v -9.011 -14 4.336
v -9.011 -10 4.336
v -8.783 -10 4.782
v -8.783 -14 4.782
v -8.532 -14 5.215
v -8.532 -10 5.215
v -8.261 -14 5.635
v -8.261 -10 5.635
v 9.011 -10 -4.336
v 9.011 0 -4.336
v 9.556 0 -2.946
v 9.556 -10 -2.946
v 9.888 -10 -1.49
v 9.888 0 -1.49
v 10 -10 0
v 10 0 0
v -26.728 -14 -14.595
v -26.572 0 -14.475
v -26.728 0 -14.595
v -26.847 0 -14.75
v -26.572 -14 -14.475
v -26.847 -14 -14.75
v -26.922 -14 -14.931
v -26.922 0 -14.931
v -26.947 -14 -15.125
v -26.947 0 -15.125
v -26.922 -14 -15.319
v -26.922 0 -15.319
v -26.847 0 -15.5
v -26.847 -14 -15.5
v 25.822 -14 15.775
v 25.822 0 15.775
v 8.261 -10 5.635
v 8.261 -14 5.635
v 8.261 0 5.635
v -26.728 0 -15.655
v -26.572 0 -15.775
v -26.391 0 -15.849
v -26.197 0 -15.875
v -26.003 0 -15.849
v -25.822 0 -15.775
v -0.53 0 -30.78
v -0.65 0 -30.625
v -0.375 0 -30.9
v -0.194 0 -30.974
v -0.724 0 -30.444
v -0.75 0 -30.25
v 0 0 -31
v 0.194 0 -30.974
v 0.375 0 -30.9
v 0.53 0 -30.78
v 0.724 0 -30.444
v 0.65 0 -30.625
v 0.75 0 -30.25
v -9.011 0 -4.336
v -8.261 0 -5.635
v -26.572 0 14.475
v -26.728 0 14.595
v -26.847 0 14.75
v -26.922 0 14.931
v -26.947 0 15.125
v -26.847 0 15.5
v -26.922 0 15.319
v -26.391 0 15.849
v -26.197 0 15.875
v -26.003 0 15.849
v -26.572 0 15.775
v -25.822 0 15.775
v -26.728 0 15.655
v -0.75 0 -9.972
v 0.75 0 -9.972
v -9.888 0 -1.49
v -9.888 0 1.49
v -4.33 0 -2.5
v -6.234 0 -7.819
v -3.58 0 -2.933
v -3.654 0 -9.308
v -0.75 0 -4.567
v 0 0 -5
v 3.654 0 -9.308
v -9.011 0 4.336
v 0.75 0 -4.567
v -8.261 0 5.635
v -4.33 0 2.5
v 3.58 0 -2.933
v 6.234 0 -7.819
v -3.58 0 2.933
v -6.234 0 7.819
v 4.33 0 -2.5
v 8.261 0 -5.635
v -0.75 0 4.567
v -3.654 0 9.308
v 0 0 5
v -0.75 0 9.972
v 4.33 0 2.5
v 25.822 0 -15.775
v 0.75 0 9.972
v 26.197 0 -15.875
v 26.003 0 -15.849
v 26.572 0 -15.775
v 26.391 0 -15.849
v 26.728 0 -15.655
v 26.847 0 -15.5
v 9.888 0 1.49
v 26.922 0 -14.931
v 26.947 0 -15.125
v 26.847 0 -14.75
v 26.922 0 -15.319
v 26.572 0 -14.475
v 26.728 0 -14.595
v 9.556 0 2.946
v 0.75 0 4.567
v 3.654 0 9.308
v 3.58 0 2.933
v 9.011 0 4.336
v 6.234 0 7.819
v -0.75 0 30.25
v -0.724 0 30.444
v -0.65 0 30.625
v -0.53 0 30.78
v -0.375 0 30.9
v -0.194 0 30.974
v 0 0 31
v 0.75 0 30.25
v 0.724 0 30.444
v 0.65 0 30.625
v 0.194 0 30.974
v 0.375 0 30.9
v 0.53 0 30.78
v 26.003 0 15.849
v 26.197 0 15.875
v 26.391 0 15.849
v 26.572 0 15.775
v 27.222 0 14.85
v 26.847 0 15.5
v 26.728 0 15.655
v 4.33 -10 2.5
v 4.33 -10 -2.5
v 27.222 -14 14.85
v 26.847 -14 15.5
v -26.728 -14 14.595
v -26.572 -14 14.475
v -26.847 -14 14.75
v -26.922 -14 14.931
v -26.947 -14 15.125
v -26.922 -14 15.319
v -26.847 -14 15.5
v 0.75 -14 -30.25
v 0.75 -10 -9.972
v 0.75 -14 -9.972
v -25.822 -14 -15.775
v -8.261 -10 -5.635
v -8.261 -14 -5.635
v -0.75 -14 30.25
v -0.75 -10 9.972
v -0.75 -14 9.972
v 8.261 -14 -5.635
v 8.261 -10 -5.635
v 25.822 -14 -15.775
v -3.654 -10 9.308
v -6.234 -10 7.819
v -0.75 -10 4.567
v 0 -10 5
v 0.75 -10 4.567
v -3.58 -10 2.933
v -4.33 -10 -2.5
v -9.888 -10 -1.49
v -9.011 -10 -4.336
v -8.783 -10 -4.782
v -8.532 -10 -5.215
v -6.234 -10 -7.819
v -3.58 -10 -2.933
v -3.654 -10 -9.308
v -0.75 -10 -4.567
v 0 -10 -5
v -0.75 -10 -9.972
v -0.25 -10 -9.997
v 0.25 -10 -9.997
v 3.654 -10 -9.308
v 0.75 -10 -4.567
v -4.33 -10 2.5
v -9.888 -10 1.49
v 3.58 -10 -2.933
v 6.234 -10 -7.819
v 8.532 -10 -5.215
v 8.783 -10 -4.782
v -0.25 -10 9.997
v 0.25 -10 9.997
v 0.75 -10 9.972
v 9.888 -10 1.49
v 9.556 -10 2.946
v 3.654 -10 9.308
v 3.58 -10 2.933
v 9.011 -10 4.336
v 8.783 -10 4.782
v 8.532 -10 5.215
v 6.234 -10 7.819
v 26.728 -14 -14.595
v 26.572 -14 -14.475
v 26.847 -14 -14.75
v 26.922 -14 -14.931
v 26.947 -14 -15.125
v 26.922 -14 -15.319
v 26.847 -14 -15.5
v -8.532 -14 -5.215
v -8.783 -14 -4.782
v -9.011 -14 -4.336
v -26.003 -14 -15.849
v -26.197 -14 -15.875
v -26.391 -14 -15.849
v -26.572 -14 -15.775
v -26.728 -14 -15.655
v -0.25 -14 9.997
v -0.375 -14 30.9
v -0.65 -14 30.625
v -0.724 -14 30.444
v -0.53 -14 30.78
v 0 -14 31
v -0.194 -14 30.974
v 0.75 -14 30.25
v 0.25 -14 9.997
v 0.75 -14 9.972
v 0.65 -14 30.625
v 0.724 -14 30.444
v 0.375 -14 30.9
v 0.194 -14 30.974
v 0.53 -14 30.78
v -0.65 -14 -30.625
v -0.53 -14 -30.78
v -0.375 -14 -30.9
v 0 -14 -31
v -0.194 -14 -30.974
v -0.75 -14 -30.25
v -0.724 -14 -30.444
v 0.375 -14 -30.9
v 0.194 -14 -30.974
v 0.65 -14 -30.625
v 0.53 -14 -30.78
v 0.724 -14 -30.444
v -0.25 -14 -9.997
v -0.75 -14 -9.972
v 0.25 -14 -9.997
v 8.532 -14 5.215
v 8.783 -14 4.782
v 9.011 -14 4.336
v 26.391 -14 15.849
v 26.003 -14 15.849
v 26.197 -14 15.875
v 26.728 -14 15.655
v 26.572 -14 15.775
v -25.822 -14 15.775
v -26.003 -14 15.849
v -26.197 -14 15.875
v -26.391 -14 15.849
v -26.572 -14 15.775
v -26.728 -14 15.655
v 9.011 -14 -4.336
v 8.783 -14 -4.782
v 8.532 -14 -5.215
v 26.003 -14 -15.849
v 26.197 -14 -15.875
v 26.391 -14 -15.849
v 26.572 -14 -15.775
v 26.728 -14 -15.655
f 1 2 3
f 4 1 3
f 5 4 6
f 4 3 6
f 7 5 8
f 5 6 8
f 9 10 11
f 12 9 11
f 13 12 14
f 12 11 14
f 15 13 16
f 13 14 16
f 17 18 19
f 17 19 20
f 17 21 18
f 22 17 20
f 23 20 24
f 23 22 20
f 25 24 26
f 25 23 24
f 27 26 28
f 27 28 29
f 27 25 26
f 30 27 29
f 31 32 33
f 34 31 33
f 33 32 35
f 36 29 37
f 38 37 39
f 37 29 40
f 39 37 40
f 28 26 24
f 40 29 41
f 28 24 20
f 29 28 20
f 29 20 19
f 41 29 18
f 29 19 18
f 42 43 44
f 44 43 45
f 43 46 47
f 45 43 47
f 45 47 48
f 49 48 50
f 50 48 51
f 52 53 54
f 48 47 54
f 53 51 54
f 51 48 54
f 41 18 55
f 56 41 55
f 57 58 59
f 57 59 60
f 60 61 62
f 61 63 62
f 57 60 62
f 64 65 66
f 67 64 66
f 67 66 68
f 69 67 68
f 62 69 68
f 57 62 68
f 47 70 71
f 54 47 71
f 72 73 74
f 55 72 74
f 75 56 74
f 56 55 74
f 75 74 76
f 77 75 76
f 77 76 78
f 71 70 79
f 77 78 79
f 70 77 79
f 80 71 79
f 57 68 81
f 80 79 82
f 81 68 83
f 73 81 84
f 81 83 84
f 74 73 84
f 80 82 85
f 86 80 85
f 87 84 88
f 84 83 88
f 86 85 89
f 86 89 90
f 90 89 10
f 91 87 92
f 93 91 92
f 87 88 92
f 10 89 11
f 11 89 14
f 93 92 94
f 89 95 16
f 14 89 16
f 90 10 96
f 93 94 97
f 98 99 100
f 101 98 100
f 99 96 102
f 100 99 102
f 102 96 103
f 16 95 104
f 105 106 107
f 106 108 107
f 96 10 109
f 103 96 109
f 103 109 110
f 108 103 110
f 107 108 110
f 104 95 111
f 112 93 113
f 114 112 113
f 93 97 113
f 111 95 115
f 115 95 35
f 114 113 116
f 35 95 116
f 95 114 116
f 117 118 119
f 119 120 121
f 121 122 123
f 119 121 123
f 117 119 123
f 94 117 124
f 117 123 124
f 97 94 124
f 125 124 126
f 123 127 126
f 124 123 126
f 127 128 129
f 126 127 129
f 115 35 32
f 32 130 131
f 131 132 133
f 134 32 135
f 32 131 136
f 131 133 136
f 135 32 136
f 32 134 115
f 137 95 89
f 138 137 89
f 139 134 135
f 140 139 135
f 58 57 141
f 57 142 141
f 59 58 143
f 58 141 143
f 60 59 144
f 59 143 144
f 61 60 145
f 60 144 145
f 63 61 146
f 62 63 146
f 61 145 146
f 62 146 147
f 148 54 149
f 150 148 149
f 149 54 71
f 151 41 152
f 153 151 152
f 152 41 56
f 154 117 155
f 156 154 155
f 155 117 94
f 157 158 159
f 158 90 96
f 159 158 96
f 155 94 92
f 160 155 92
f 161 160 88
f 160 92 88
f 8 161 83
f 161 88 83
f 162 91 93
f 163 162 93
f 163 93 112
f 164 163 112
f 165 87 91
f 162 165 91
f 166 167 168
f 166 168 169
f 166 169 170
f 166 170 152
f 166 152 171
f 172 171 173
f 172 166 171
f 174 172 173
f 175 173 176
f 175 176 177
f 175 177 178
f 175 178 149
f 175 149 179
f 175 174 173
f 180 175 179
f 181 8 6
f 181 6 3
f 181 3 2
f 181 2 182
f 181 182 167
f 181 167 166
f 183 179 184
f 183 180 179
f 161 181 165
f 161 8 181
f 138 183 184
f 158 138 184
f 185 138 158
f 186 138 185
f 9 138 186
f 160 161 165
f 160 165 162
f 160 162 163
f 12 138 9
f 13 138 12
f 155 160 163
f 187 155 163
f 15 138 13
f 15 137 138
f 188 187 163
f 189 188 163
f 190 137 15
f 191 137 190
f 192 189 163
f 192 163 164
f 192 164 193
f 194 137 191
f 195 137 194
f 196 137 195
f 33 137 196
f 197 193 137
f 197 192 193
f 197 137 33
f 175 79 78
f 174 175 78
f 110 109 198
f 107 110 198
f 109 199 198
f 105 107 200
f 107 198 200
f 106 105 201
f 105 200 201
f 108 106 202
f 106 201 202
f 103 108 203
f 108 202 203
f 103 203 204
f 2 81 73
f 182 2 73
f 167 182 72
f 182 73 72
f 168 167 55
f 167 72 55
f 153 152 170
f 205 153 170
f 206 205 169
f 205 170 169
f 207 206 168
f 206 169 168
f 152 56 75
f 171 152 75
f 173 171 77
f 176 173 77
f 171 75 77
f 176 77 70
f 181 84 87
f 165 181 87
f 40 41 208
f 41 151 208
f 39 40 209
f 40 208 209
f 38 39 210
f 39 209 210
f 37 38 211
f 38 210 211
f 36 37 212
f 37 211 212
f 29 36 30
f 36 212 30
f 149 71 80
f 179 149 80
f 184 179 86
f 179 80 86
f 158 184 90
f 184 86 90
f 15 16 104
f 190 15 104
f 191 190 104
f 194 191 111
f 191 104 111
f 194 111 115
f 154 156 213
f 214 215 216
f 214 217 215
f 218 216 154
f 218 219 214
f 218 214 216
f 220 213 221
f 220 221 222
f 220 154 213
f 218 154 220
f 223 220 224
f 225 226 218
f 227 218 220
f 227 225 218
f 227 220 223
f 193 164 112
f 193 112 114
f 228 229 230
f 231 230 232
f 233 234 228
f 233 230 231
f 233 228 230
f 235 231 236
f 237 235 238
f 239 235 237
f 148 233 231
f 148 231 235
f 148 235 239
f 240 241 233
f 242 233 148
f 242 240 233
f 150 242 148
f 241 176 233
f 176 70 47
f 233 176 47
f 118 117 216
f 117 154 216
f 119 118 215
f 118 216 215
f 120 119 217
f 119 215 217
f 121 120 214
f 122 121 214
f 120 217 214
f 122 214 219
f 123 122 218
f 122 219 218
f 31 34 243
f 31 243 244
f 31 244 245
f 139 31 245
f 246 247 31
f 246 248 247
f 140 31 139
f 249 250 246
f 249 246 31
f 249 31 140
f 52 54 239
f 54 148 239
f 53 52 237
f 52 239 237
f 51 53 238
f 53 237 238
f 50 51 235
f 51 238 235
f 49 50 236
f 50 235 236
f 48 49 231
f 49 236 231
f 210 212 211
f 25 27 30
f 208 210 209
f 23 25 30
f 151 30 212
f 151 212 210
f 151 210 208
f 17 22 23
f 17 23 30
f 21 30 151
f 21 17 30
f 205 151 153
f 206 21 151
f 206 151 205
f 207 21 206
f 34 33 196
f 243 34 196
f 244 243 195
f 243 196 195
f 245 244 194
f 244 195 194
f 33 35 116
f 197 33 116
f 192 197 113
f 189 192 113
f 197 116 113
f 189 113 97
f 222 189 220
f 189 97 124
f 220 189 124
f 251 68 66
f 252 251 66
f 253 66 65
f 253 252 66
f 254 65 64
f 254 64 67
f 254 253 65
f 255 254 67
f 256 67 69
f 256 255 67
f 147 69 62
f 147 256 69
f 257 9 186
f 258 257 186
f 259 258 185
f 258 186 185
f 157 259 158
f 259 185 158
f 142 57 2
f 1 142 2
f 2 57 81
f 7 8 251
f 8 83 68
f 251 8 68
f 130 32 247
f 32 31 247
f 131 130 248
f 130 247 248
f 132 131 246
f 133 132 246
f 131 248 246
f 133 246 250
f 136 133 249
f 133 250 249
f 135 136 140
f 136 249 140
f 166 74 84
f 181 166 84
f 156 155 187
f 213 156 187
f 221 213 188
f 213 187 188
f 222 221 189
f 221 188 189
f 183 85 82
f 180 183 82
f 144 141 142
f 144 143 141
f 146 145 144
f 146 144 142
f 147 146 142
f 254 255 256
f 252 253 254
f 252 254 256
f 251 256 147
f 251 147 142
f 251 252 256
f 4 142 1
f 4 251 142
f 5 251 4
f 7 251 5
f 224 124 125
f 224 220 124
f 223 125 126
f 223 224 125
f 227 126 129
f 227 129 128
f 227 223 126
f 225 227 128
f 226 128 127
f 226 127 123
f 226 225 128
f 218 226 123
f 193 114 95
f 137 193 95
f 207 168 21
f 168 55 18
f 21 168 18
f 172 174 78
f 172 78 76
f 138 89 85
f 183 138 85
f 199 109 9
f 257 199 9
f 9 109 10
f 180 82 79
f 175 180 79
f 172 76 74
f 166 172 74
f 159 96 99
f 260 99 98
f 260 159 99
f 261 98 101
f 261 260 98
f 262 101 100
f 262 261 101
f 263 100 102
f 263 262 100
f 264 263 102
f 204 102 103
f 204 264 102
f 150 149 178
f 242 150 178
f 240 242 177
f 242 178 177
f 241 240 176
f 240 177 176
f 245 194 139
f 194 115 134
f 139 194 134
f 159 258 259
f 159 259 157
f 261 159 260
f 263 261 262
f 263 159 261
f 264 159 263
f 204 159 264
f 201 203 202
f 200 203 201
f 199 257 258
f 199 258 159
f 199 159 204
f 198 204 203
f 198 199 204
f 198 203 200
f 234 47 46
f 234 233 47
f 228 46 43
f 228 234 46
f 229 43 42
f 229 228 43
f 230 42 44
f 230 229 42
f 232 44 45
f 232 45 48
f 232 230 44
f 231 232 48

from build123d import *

# Parameters (mm, degrees)
F1_DEPTH = 10
F2_DEPTH = 14
F3_R     = 0.74999


# Not quite as in the source:
# - a fillet or chamfer is up to 0.001 mm smaller than in the source, because OpenCascade refuses the exact size
# - a feature names something its author has since deleted; it is built from what else it names


with BuildPart() as f1:
    # F0 (on Front) → F1 (new body)
    with BuildSketch(Plane.XZ):
        with BuildLine():
            ThreePointArc((9.0108627247, -4.336398616), (9.7495801768, -2.22388992), (10, 0))
            ThreePointArc((10, 0), (9.7495801768, 2.22388992), (9.0108627247, 4.336398616))
            Line((9.0108627247, 4.336398616), (4.6561359474, 1.8221959388))
            ThreePointArc((4.6561359474, 1.8221959388), (4.9132819854, 0.9271785866), (5, 0))
            ThreePointArc((5, 0), (4.9132819854, -0.9271785866), (4.6561359474, -1.8221959388))
            Line((4.6561359474, -1.8221959388), (9.0108627247, -4.336398616))
        make_face()
        with BuildLine():
            Line((4.6561359474, 1.8221959388), (9.0108627247, 4.336398616))
            ThreePointArc((9.0108627247, 4.336398616), (8.6602540378, 5), (8.2608627247, 5.6354367216))
            Line((8.2608627247, 5.6354367216), (3.9061359474, 3.1212340445))
            ThreePointArc((3.9061359474, 3.1212340445), (4.1298292758, 2.8186007438), (4.3301270189, 2.5))
            ThreePointArc((4.3301270189, 2.5), (4.5058944851, 2.1672366942), (4.6561359474, 1.8221959388))
        make_face()
        with BuildLine():
            ThreePointArc((8.2608627247, -5.6354367216), (8.6602540378, -5), (9.0108627247, -4.336398616))
            Line((9.0108627247, -4.336398616), (4.6561359474, -1.8221959388))
            ThreePointArc((4.6561359474, -1.8221959388), (4.5058944851, -2.1672366942), (4.3301270189, -2.5))
            ThreePointArc((4.3301270189, -2.5), (4.1298292758, -2.8186007438), (3.9061359474, -3.1212340445))
            Line((3.9061359474, -3.1212340445), (8.2608627247, -5.6354367216))
        make_face()
        with BuildLine():
            Line((3.9061359474, 3.1212340445), (8.2608627247, 5.6354367216))
            ThreePointArc((8.2608627247, 5.6354367216), (5, 8.6602540378), (0.75, 9.9718353376))
            Line((0.75, 9.9718353376), (0.75, 4.9434299833))
            ThreePointArc((0.75, 4.9434299833), (2.5, 4.3301270189), (3.9061359474, 3.1212340445))
        make_face()
        with BuildLine():
            Line((4.3301270189, 1.6339745962), (4.6561359474, 1.8221959388))
            ThreePointArc((4.6561359474, 1.8221959388), (4.5058944851, 2.1672366942), (4.3301270189, 2.5))
            Line((4.3301270189, 2.5), (4.3301270189, 1.6339745962))
        make_face()
        with BuildLine():
            ThreePointArc((5, 0), (4.9132819854, 0.9271785866), (4.6561359474, 1.8221959388))
            Line((4.6561359474, 1.8221959388), (4.3301270189, 1.6339745962))
            Line((4.3301270189, 1.6339745962), (4.3301270189, -1.6339745962))
            Line((4.3301270189, -1.6339745962), (4.6561359474, -1.8221959388))
            ThreePointArc((4.6561359474, -1.8221959388), (4.9132819854, -0.9271785866), (5, 0))
        make_face()
        with BuildLine():
            ThreePointArc((0.75, -9.9718353376), (5, -8.6602540378), (8.2608627247, -5.6354367216))
            Line((8.2608627247, -5.6354367216), (3.9061359474, -3.1212340445))
            ThreePointArc((3.9061359474, -3.1212340445), (2.5, -4.3301270189), (0.75, -4.9434299833))
            Line((0.75, -4.9434299833), (0.75, -9.9718353376))
        make_face()
        with BuildLine():
            ThreePointArc((4.3301270189, -2.5), (4.5058944851, -2.1672366942), (4.6561359474, -1.8221959388))
            Line((4.6561359474, -1.8221959388), (4.3301270189, -1.6339745962))
            Line((4.3301270189, -1.6339745962), (4.3301270189, -2.5))
        make_face()
        with BuildLine():
            Line((0.75, 4.9434299833), (0.75, 9.9718353376))
            ThreePointArc((0.75, 9.9718353376), (0, 10), (-0.75, 9.9718353376))
            Line((-0.75, 9.9718353376), (-0.75, 4.9434299833))
            ThreePointArc((-0.75, 4.9434299833), (-0.3760652094, 4.985837438), (0, 5))
            ThreePointArc((0, 5), (0.3760652094, 4.985837438), (0.75, 4.9434299833))
        make_face()
        with BuildLine():
            Line((3.5801270189, 2.9330127019), (3.9061359474, 3.1212340445))
            ThreePointArc((3.9061359474, 3.1212340445), (2.5, 4.3301270189), (0.75, 4.9434299833))
            Line((0.75, 4.9434299833), (0.75, 4.5669872981))
            Line((0.75, 4.5669872981), (3.5801270189, 2.9330127019))
        make_face()
        with BuildLine():
            ThreePointArc((4.3301270189, 2.5), (4.1298292758, 2.8186007438), (3.9061359474, 3.1212340445))
            Line((3.9061359474, 3.1212340445), (3.5801270189, 2.9330127019))
            Line((3.5801270189, 2.9330127019), (4.3301270189, 2.5))
        make_face()
        with BuildLine():
            ThreePointArc((-0.75, -9.9718353376), (0, -10), (0.75, -9.9718353376))
            Line((0.75, -9.9718353376), (0.75, -4.9434299833))
            ThreePointArc((0.75, -4.9434299833), (0.3760652094, -4.985837438), (0, -5))
            ThreePointArc((0, -5), (-0.3760652094, -4.985837438), (-0.75, -4.9434299833))
            Line((-0.75, -4.9434299833), (-0.75, -9.9718353376))
        make_face()
        with BuildLine():
            Line((3.5801270189, -2.9330127019), (3.9061359474, -3.1212340445))
            ThreePointArc((3.9061359474, -3.1212340445), (4.1298292758, -2.8186007438), (4.3301270189, -2.5))
            Line((4.3301270189, -2.5), (3.5801270189, -2.9330127019))
        make_face()
        with BuildLine():
            ThreePointArc((0.75, -4.9434299833), (2.5, -4.3301270189), (3.9061359474, -3.1212340445))
            Line((3.9061359474, -3.1212340445), (3.5801270189, -2.9330127019))
            Line((3.5801270189, -2.9330127019), (0.75, -4.5669872981))
            Line((0.75, -4.5669872981), (0.75, -4.9434299833))
        make_face()
        with BuildLine():
            Line((-0.75, 4.9434299833), (-0.75, 9.9718353376))
            ThreePointArc((-0.75, 9.9718353376), (-5, 8.6602540378), (-8.2608627247, 5.6354367216))
            Line((-8.2608627247, 5.6354367216), (-3.9061359474, 3.1212340445))
            ThreePointArc((-3.9061359474, 3.1212340445), (-2.5, 4.3301270189), (-0.75, 4.9434299833))
        make_face()
        with BuildLine():
            Line((0.75, 4.5669872981), (0.75, 4.9434299833))
            ThreePointArc((0.75, 4.9434299833), (0.3760652094, 4.985837438), (0, 5))
            Line((0, 5), (0.75, 4.5669872981))
        make_face()
        with BuildLine():
            ThreePointArc((-8.2608627247, -5.6354367216), (-5, -8.6602540378), (-0.75, -9.9718353376))
            Line((-0.75, -9.9718353376), (-0.75, -4.9434299833))
            ThreePointArc((-0.75, -4.9434299833), (-2.5, -4.3301270189), (-3.9061359474, -3.1212340445))
            Line((-3.9061359474, -3.1212340445), (-8.2608627247, -5.6354367216))
        make_face()
        with BuildLine():
            ThreePointArc((0, -5), (0.3760652094, -4.985837438), (0.75, -4.9434299833))
            Line((0.75, -4.9434299833), (0.75, -4.5669872981))
            Line((0.75, -4.5669872981), (0, -5))
        make_face()
        with BuildLine():
            Line((-3.9061359474, 3.1212340445), (-8.2608627247, 5.6354367216))
            ThreePointArc((-8.2608627247, 5.6354367216), (-8.6602540378, 5), (-9.0108627247, 4.336398616))
            Line((-9.0108627247, 4.336398616), (-4.6561359474, 1.8221959388))
            ThreePointArc((-4.6561359474, 1.8221959388), (-4.5058944851, 2.1672366942), (-4.3301270189, 2.5))
            ThreePointArc((-4.3301270189, 2.5), (-4.1298292758, 2.8186007438), (-3.9061359474, 3.1212340445))
        make_face()
        with BuildLine():
            Line((-0.75, 4.5669872981), (-0.75, 4.9434299833))
            ThreePointArc((-0.75, 4.9434299833), (-2.5, 4.3301270189), (-3.9061359474, 3.1212340445))
            Line((-3.9061359474, 3.1212340445), (-3.5801270189, 2.9330127019))
            Line((-3.5801270189, 2.9330127019), (-0.75, 4.5669872981))
        make_face()
        with BuildLine():
            ThreePointArc((0, 5), (-0.3760652094, 4.985837438), (-0.75, 4.9434299833))
            Line((-0.75, 4.9434299833), (-0.75, 4.5669872981))
            Line((-0.75, 4.5669872981), (0, 5))
        make_face()
        with BuildLine():
            ThreePointArc((-9.0108627247, -4.336398616), (-8.6602540378, -5), (-8.2608627247, -5.6354367216))
            Line((-8.2608627247, -5.6354367216), (-3.9061359474, -3.1212340445))
            ThreePointArc((-3.9061359474, -3.1212340445), (-4.1298292758, -2.8186007438), (-4.3301270189, -2.5))
            ThreePointArc((-4.3301270189, -2.5), (-4.5058944851, -2.1672366942), (-4.6561359474, -1.8221959388))
            Line((-4.6561359474, -1.8221959388), (-9.0108627247, -4.336398616))
        make_face()
        with BuildLine():
            Line((-0.75, -4.5669872981), (-0.75, -4.9434299833))
            ThreePointArc((-0.75, -4.9434299833), (-0.3760652094, -4.985837438), (0, -5))
            Line((0, -5), (-0.75, -4.5669872981))
        make_face()
        with BuildLine():
            ThreePointArc((-3.9061359474, -3.1212340445), (-2.5, -4.3301270189), (-0.75, -4.9434299833))
            Line((-0.75, -4.9434299833), (-0.75, -4.5669872981))
            Line((-0.75, -4.5669872981), (-3.5801270189, -2.9330127019))
            Line((-3.5801270189, -2.9330127019), (-3.9061359474, -3.1212340445))
        make_face()
        with BuildLine():
            Line((-4.6561359474, 1.8221959388), (-9.0108627247, 4.336398616))
            ThreePointArc((-9.0108627247, 4.336398616), (-10, 0), (-9.0108627247, -4.336398616))
            Line((-9.0108627247, -4.336398616), (-4.6561359474, -1.8221959388))
            ThreePointArc((-4.6561359474, -1.8221959388), (-5, 0), (-4.6561359474, 1.8221959388))
        make_face()
        with BuildLine():
            Line((-3.5801270189, 2.9330127019), (-3.9061359474, 3.1212340445))
            ThreePointArc((-3.9061359474, 3.1212340445), (-4.1298292758, 2.8186007438), (-4.3301270189, 2.5))
            Line((-4.3301270189, 2.5), (-3.5801270189, 2.9330127019))
        make_face()
        with BuildLine():
            ThreePointArc((-4.3301270189, -2.5), (-4.1298292758, -2.8186007438), (-3.9061359474, -3.1212340445))
            Line((-3.9061359474, -3.1212340445), (-3.5801270189, -2.9330127019))
            Line((-3.5801270189, -2.9330127019), (-4.3301270189, -2.5))
        make_face()
        with BuildLine():
            Line((-4.3301270189, 1.6339745962), (-4.6561359474, 1.8221959388))
            ThreePointArc((-4.6561359474, 1.8221959388), (-5, 0), (-4.6561359474, -1.8221959388))
            Line((-4.6561359474, -1.8221959388), (-4.3301270189, -1.6339745962))
            Line((-4.3301270189, -1.6339745962), (-4.3301270189, 1.6339745962))
        make_face()
        with BuildLine():
            ThreePointArc((-4.3301270189, 2.5), (-4.5058944851, 2.1672366942), (-4.6561359474, 1.8221959388))
            Line((-4.6561359474, 1.8221959388), (-4.3301270189, 1.6339745962))
            Line((-4.3301270189, 1.6339745962), (-4.3301270189, 2.5))
        make_face()
        with BuildLine():
            Line((-4.3301270189, -1.6339745962), (-4.6561359474, -1.8221959388))
            ThreePointArc((-4.6561359474, -1.8221959388), (-4.5058944851, -2.1672366942), (-4.3301270189, -2.5))
            Line((-4.3301270189, -2.5), (-4.3301270189, -1.6339745962))
        make_face()
    extrude(amount=F1_DEPTH)

    # F0 (on Front) → F2 (join)
    with BuildSketch(Plane.XZ):
        with BuildLine():
            ThreePointArc((-0.75, 9.9718353376), (0, 10), (0.75, 9.9718353376))
            Line((0.75, 9.9718353376), (0.75, 31))
            Line((0.75, 31), (-0.75, 31))
            Line((-0.75, 31), (-0.75, 9.9718353376))
        make_face()
        with BuildLine():
            Line((27.2217875173, -14.8504809472), (9.0108627247, -4.336398616))
            ThreePointArc((9.0108627247, -4.336398616), (8.6602540378, -5), (8.2608627247, -5.6354367216))
            Line((8.2608627247, -5.6354367216), (26.4717875173, -16.1495190528))
            Line((26.4717875173, -16.1495190528), (27.2217875173, -14.8504809472))
        make_face()
        with BuildLine():
            ThreePointArc((8.2608627247, 5.6354367216), (8.6602540378, 5), (9.0108627247, 4.336398616))
            Line((9.0108627247, 4.336398616), (27.2217875173, 14.8504809472))
            Line((27.2217875173, 14.8504809472), (26.4717875173, 16.1495190528))
            Line((26.4717875173, 16.1495190528), (8.2608627247, 5.6354367216))
        make_face()
        with BuildLine():
            Line((0.75, -31), (0.75, -9.9718353376))
            ThreePointArc((0.75, -9.9718353376), (0, -10), (-0.75, -9.9718353376))
            Line((-0.75, -9.9718353376), (-0.75, -31))
            Line((-0.75, -31), (0.75, -31))
        make_face()
        with BuildLine():
            Line((-26.4717875173, -16.1495190528), (-8.2608627247, -5.6354367216))
            ThreePointArc((-8.2608627247, -5.6354367216), (-8.6602540378, -5), (-9.0108627247, -4.336398616))
            Line((-9.0108627247, -4.336398616), (-27.2217875173, -14.8504809472))
            Line((-27.2217875173, -14.8504809472), (-26.4717875173, -16.1495190528))
        make_face()
        with BuildLine():
            ThreePointArc((-9.0108627247, 4.336398616), (-8.6602540378, 5), (-8.2608627247, 5.6354367216))
            Line((-8.2608627247, 5.6354367216), (-26.4717875173, 16.1495190528))
            Line((-26.4717875173, 16.1495190528), (-27.2217875173, 14.8504809472))
            Line((-27.2217875173, 14.8504809472), (-9.0108627247, 4.336398616))
        make_face()
    extrude(amount=F2_DEPTH)

    # F3 (radius 0.75 in the source; OpenCascade refuses exactly that, so slightly less here)
    f3_edges = [f1.edges().sort_by_distance(p)[0] for p in [
        (26.471788, -7, 16.149519),
        (27.221788, -7, -14.850481),
        (26.471788, -7, -16.149519),
        (0.75, -7, -31),
        (-0.75, -7, -31),
        (-26.471788, -7, -16.149519),
        (-27.221788, -7, -14.850481),
        (-26.471788, -7, 16.149519),
        (-27.221788, -7, 14.850481),
        (0.75, -7, 31),
        (-0.75, -7, 31),
    ]]
    fillet(f3_edges, radius=F3_R)


solid = f1.part
